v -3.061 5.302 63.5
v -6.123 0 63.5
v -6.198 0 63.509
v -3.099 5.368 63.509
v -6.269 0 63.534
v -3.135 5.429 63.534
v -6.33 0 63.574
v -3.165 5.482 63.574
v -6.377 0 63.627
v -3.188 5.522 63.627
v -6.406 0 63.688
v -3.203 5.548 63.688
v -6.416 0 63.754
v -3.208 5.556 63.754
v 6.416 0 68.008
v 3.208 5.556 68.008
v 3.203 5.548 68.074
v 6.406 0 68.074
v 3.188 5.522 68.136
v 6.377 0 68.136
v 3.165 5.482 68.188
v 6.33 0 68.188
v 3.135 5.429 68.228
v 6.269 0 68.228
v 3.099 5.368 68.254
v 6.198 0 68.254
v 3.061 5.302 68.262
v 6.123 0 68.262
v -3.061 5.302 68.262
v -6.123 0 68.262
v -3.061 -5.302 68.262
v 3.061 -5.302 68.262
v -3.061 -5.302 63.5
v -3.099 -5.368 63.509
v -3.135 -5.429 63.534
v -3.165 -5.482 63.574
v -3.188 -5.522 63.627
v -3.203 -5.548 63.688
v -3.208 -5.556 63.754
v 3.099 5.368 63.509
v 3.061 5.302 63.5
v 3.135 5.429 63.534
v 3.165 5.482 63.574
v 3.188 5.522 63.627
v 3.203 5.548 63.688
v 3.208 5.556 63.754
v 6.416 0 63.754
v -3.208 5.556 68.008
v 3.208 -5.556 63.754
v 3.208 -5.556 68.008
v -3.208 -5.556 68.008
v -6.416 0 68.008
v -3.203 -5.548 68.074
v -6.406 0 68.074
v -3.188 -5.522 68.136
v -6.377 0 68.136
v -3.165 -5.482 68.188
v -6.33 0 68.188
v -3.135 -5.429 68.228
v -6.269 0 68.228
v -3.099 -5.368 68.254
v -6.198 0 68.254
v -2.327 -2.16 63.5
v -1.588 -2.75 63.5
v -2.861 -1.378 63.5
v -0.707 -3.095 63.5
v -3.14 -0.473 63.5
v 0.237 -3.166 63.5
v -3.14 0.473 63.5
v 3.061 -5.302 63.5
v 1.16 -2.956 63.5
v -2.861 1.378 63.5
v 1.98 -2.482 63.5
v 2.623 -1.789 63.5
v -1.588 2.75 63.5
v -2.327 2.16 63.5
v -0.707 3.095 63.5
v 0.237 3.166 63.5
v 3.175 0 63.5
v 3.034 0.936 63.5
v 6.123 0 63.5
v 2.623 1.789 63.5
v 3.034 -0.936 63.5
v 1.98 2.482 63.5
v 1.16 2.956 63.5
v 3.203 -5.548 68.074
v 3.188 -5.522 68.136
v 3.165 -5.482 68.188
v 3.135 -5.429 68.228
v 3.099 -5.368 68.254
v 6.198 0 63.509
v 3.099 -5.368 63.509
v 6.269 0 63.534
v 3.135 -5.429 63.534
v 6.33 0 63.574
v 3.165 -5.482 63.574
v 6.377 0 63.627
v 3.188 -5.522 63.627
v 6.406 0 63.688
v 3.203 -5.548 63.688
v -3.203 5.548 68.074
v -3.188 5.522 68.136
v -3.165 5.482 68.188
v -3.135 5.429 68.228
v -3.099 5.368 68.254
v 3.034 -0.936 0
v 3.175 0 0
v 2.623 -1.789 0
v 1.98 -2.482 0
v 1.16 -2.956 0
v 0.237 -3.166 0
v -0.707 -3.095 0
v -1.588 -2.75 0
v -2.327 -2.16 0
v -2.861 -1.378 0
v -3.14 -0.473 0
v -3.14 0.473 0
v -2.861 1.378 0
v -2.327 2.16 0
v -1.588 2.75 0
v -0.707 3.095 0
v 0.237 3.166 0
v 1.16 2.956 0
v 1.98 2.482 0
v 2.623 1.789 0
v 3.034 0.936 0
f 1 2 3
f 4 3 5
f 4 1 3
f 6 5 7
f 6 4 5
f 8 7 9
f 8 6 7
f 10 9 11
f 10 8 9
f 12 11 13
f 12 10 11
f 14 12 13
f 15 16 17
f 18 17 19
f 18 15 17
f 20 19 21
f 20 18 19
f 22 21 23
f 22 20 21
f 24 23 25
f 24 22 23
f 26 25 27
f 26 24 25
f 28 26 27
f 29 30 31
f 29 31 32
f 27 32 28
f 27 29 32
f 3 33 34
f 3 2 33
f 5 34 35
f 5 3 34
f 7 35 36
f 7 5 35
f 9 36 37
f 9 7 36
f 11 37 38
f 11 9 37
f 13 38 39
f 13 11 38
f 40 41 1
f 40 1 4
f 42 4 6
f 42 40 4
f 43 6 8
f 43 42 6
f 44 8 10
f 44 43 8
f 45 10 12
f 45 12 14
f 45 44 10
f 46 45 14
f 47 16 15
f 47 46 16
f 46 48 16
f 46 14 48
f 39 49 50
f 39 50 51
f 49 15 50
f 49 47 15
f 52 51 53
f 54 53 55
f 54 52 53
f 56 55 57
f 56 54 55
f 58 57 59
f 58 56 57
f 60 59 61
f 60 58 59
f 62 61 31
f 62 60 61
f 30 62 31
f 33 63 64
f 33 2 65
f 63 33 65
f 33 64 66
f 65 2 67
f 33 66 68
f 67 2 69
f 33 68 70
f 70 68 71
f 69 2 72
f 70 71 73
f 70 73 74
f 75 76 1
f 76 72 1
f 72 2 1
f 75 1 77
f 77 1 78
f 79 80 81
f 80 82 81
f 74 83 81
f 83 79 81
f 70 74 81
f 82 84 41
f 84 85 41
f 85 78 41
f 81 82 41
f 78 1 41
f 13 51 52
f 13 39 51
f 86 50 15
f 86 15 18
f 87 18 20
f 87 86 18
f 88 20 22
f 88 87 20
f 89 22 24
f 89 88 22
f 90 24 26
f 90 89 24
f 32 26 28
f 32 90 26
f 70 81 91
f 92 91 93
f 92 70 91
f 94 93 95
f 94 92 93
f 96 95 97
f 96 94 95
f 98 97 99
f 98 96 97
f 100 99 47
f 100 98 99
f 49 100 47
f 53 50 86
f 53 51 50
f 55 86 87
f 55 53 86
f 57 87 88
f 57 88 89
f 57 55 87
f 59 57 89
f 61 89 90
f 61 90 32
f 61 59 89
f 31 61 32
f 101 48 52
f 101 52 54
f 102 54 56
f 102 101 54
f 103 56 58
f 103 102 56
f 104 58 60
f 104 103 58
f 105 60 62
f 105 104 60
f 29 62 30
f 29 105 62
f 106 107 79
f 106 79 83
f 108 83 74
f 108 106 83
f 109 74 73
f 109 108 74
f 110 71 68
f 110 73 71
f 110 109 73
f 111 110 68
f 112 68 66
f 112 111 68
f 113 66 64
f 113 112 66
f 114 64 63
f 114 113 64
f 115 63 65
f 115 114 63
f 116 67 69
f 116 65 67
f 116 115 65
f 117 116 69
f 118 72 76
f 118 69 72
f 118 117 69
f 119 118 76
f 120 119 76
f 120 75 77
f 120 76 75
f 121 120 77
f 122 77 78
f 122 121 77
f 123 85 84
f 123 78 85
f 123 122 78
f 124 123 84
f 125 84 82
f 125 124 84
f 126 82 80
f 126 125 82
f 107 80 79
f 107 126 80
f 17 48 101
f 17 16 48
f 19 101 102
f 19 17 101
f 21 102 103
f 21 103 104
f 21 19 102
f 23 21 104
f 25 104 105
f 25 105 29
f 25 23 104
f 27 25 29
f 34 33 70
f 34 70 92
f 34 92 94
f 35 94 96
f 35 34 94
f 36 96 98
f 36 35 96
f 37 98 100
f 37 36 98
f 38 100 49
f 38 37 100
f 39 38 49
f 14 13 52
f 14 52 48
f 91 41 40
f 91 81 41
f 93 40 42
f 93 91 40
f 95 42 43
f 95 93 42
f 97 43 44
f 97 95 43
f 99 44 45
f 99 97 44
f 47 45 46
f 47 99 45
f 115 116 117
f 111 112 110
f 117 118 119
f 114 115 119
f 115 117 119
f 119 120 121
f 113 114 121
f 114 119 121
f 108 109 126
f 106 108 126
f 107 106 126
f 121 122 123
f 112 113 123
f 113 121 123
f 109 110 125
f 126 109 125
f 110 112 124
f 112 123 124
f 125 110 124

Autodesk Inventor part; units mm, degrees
ref_plane "YZ Plane" through (0, 0, 0) normal (1, 0, 0) x (0, 1, 0)
ref_plane "XZ Plane" through (0, 0, 0) normal (0, 1, 0) x (-1, 0, 0)
ref_plane "XY Plane" through (0, 0, 0) normal (0, 0, 1) x (1, 0, 0)
sketch "Sketch1" plane through (0, 0, 0) normal (0, 0, 1) x (1, 0, 0)
  circle A0 centre (0, 0) radius 3.175
  dimension "d0" = 6.35
extrude "Extrusion1" add sketch "Sketch1" along normal blind 63.5
sketch "Sketch2" plane through (0, 0, 63.5) normal (0, 0, 1) x (1, 0, 0)
  circle A0 centre (0, 0) radius 3.175 projected
  line L0 (3.2079, 5.5562) -> (6.4158, 0)
  line L1 (6.4158, 0) -> (3.2079, -5.5562)
  line L2 (3.2079, -5.5562) -> (-3.2079, -5.5562)
  line L3 (-3.2079, -5.5562) -> (-6.4158, 0)
  line L4 (-6.4158, 0) -> (-3.2079, 5.5562)
  line L5 (-3.2079, 5.5562) -> (3.2079, 5.5562)
  dimension "d4" = 11.1125
extrude "Extrusion2" add sketch "Sketch2" along normal blind 4.7625 contours A0 | L0 L1 L2 L3 L4 L5
fillet "Fillet1" radius 0.254 12 edges at (4.8119, 2.7781, 68.2625) (0, 5.5562, 68.2625) (-4.8119, 2.7781, 68.2625) (-4.8119, -2.7781, 68.2625) (0, -5.5562, 68.2625) (4.8119, -2.7781, 68.2625) (4.8119, -2.7781, 63.5) (4.8119, 2.7781, 63.5) (0, 5.5562, 63.5) (-4.8119, 2.7781, 63.5) (-4.8119, -2.7781, 63.5) (0, -5.5562, 63.5)
thread "Thread1" size "1/4-20 UNC" class "2A" standard "ANSI Unified Screw Threads" length 28.575
properties part number "Deck_Bolt"
